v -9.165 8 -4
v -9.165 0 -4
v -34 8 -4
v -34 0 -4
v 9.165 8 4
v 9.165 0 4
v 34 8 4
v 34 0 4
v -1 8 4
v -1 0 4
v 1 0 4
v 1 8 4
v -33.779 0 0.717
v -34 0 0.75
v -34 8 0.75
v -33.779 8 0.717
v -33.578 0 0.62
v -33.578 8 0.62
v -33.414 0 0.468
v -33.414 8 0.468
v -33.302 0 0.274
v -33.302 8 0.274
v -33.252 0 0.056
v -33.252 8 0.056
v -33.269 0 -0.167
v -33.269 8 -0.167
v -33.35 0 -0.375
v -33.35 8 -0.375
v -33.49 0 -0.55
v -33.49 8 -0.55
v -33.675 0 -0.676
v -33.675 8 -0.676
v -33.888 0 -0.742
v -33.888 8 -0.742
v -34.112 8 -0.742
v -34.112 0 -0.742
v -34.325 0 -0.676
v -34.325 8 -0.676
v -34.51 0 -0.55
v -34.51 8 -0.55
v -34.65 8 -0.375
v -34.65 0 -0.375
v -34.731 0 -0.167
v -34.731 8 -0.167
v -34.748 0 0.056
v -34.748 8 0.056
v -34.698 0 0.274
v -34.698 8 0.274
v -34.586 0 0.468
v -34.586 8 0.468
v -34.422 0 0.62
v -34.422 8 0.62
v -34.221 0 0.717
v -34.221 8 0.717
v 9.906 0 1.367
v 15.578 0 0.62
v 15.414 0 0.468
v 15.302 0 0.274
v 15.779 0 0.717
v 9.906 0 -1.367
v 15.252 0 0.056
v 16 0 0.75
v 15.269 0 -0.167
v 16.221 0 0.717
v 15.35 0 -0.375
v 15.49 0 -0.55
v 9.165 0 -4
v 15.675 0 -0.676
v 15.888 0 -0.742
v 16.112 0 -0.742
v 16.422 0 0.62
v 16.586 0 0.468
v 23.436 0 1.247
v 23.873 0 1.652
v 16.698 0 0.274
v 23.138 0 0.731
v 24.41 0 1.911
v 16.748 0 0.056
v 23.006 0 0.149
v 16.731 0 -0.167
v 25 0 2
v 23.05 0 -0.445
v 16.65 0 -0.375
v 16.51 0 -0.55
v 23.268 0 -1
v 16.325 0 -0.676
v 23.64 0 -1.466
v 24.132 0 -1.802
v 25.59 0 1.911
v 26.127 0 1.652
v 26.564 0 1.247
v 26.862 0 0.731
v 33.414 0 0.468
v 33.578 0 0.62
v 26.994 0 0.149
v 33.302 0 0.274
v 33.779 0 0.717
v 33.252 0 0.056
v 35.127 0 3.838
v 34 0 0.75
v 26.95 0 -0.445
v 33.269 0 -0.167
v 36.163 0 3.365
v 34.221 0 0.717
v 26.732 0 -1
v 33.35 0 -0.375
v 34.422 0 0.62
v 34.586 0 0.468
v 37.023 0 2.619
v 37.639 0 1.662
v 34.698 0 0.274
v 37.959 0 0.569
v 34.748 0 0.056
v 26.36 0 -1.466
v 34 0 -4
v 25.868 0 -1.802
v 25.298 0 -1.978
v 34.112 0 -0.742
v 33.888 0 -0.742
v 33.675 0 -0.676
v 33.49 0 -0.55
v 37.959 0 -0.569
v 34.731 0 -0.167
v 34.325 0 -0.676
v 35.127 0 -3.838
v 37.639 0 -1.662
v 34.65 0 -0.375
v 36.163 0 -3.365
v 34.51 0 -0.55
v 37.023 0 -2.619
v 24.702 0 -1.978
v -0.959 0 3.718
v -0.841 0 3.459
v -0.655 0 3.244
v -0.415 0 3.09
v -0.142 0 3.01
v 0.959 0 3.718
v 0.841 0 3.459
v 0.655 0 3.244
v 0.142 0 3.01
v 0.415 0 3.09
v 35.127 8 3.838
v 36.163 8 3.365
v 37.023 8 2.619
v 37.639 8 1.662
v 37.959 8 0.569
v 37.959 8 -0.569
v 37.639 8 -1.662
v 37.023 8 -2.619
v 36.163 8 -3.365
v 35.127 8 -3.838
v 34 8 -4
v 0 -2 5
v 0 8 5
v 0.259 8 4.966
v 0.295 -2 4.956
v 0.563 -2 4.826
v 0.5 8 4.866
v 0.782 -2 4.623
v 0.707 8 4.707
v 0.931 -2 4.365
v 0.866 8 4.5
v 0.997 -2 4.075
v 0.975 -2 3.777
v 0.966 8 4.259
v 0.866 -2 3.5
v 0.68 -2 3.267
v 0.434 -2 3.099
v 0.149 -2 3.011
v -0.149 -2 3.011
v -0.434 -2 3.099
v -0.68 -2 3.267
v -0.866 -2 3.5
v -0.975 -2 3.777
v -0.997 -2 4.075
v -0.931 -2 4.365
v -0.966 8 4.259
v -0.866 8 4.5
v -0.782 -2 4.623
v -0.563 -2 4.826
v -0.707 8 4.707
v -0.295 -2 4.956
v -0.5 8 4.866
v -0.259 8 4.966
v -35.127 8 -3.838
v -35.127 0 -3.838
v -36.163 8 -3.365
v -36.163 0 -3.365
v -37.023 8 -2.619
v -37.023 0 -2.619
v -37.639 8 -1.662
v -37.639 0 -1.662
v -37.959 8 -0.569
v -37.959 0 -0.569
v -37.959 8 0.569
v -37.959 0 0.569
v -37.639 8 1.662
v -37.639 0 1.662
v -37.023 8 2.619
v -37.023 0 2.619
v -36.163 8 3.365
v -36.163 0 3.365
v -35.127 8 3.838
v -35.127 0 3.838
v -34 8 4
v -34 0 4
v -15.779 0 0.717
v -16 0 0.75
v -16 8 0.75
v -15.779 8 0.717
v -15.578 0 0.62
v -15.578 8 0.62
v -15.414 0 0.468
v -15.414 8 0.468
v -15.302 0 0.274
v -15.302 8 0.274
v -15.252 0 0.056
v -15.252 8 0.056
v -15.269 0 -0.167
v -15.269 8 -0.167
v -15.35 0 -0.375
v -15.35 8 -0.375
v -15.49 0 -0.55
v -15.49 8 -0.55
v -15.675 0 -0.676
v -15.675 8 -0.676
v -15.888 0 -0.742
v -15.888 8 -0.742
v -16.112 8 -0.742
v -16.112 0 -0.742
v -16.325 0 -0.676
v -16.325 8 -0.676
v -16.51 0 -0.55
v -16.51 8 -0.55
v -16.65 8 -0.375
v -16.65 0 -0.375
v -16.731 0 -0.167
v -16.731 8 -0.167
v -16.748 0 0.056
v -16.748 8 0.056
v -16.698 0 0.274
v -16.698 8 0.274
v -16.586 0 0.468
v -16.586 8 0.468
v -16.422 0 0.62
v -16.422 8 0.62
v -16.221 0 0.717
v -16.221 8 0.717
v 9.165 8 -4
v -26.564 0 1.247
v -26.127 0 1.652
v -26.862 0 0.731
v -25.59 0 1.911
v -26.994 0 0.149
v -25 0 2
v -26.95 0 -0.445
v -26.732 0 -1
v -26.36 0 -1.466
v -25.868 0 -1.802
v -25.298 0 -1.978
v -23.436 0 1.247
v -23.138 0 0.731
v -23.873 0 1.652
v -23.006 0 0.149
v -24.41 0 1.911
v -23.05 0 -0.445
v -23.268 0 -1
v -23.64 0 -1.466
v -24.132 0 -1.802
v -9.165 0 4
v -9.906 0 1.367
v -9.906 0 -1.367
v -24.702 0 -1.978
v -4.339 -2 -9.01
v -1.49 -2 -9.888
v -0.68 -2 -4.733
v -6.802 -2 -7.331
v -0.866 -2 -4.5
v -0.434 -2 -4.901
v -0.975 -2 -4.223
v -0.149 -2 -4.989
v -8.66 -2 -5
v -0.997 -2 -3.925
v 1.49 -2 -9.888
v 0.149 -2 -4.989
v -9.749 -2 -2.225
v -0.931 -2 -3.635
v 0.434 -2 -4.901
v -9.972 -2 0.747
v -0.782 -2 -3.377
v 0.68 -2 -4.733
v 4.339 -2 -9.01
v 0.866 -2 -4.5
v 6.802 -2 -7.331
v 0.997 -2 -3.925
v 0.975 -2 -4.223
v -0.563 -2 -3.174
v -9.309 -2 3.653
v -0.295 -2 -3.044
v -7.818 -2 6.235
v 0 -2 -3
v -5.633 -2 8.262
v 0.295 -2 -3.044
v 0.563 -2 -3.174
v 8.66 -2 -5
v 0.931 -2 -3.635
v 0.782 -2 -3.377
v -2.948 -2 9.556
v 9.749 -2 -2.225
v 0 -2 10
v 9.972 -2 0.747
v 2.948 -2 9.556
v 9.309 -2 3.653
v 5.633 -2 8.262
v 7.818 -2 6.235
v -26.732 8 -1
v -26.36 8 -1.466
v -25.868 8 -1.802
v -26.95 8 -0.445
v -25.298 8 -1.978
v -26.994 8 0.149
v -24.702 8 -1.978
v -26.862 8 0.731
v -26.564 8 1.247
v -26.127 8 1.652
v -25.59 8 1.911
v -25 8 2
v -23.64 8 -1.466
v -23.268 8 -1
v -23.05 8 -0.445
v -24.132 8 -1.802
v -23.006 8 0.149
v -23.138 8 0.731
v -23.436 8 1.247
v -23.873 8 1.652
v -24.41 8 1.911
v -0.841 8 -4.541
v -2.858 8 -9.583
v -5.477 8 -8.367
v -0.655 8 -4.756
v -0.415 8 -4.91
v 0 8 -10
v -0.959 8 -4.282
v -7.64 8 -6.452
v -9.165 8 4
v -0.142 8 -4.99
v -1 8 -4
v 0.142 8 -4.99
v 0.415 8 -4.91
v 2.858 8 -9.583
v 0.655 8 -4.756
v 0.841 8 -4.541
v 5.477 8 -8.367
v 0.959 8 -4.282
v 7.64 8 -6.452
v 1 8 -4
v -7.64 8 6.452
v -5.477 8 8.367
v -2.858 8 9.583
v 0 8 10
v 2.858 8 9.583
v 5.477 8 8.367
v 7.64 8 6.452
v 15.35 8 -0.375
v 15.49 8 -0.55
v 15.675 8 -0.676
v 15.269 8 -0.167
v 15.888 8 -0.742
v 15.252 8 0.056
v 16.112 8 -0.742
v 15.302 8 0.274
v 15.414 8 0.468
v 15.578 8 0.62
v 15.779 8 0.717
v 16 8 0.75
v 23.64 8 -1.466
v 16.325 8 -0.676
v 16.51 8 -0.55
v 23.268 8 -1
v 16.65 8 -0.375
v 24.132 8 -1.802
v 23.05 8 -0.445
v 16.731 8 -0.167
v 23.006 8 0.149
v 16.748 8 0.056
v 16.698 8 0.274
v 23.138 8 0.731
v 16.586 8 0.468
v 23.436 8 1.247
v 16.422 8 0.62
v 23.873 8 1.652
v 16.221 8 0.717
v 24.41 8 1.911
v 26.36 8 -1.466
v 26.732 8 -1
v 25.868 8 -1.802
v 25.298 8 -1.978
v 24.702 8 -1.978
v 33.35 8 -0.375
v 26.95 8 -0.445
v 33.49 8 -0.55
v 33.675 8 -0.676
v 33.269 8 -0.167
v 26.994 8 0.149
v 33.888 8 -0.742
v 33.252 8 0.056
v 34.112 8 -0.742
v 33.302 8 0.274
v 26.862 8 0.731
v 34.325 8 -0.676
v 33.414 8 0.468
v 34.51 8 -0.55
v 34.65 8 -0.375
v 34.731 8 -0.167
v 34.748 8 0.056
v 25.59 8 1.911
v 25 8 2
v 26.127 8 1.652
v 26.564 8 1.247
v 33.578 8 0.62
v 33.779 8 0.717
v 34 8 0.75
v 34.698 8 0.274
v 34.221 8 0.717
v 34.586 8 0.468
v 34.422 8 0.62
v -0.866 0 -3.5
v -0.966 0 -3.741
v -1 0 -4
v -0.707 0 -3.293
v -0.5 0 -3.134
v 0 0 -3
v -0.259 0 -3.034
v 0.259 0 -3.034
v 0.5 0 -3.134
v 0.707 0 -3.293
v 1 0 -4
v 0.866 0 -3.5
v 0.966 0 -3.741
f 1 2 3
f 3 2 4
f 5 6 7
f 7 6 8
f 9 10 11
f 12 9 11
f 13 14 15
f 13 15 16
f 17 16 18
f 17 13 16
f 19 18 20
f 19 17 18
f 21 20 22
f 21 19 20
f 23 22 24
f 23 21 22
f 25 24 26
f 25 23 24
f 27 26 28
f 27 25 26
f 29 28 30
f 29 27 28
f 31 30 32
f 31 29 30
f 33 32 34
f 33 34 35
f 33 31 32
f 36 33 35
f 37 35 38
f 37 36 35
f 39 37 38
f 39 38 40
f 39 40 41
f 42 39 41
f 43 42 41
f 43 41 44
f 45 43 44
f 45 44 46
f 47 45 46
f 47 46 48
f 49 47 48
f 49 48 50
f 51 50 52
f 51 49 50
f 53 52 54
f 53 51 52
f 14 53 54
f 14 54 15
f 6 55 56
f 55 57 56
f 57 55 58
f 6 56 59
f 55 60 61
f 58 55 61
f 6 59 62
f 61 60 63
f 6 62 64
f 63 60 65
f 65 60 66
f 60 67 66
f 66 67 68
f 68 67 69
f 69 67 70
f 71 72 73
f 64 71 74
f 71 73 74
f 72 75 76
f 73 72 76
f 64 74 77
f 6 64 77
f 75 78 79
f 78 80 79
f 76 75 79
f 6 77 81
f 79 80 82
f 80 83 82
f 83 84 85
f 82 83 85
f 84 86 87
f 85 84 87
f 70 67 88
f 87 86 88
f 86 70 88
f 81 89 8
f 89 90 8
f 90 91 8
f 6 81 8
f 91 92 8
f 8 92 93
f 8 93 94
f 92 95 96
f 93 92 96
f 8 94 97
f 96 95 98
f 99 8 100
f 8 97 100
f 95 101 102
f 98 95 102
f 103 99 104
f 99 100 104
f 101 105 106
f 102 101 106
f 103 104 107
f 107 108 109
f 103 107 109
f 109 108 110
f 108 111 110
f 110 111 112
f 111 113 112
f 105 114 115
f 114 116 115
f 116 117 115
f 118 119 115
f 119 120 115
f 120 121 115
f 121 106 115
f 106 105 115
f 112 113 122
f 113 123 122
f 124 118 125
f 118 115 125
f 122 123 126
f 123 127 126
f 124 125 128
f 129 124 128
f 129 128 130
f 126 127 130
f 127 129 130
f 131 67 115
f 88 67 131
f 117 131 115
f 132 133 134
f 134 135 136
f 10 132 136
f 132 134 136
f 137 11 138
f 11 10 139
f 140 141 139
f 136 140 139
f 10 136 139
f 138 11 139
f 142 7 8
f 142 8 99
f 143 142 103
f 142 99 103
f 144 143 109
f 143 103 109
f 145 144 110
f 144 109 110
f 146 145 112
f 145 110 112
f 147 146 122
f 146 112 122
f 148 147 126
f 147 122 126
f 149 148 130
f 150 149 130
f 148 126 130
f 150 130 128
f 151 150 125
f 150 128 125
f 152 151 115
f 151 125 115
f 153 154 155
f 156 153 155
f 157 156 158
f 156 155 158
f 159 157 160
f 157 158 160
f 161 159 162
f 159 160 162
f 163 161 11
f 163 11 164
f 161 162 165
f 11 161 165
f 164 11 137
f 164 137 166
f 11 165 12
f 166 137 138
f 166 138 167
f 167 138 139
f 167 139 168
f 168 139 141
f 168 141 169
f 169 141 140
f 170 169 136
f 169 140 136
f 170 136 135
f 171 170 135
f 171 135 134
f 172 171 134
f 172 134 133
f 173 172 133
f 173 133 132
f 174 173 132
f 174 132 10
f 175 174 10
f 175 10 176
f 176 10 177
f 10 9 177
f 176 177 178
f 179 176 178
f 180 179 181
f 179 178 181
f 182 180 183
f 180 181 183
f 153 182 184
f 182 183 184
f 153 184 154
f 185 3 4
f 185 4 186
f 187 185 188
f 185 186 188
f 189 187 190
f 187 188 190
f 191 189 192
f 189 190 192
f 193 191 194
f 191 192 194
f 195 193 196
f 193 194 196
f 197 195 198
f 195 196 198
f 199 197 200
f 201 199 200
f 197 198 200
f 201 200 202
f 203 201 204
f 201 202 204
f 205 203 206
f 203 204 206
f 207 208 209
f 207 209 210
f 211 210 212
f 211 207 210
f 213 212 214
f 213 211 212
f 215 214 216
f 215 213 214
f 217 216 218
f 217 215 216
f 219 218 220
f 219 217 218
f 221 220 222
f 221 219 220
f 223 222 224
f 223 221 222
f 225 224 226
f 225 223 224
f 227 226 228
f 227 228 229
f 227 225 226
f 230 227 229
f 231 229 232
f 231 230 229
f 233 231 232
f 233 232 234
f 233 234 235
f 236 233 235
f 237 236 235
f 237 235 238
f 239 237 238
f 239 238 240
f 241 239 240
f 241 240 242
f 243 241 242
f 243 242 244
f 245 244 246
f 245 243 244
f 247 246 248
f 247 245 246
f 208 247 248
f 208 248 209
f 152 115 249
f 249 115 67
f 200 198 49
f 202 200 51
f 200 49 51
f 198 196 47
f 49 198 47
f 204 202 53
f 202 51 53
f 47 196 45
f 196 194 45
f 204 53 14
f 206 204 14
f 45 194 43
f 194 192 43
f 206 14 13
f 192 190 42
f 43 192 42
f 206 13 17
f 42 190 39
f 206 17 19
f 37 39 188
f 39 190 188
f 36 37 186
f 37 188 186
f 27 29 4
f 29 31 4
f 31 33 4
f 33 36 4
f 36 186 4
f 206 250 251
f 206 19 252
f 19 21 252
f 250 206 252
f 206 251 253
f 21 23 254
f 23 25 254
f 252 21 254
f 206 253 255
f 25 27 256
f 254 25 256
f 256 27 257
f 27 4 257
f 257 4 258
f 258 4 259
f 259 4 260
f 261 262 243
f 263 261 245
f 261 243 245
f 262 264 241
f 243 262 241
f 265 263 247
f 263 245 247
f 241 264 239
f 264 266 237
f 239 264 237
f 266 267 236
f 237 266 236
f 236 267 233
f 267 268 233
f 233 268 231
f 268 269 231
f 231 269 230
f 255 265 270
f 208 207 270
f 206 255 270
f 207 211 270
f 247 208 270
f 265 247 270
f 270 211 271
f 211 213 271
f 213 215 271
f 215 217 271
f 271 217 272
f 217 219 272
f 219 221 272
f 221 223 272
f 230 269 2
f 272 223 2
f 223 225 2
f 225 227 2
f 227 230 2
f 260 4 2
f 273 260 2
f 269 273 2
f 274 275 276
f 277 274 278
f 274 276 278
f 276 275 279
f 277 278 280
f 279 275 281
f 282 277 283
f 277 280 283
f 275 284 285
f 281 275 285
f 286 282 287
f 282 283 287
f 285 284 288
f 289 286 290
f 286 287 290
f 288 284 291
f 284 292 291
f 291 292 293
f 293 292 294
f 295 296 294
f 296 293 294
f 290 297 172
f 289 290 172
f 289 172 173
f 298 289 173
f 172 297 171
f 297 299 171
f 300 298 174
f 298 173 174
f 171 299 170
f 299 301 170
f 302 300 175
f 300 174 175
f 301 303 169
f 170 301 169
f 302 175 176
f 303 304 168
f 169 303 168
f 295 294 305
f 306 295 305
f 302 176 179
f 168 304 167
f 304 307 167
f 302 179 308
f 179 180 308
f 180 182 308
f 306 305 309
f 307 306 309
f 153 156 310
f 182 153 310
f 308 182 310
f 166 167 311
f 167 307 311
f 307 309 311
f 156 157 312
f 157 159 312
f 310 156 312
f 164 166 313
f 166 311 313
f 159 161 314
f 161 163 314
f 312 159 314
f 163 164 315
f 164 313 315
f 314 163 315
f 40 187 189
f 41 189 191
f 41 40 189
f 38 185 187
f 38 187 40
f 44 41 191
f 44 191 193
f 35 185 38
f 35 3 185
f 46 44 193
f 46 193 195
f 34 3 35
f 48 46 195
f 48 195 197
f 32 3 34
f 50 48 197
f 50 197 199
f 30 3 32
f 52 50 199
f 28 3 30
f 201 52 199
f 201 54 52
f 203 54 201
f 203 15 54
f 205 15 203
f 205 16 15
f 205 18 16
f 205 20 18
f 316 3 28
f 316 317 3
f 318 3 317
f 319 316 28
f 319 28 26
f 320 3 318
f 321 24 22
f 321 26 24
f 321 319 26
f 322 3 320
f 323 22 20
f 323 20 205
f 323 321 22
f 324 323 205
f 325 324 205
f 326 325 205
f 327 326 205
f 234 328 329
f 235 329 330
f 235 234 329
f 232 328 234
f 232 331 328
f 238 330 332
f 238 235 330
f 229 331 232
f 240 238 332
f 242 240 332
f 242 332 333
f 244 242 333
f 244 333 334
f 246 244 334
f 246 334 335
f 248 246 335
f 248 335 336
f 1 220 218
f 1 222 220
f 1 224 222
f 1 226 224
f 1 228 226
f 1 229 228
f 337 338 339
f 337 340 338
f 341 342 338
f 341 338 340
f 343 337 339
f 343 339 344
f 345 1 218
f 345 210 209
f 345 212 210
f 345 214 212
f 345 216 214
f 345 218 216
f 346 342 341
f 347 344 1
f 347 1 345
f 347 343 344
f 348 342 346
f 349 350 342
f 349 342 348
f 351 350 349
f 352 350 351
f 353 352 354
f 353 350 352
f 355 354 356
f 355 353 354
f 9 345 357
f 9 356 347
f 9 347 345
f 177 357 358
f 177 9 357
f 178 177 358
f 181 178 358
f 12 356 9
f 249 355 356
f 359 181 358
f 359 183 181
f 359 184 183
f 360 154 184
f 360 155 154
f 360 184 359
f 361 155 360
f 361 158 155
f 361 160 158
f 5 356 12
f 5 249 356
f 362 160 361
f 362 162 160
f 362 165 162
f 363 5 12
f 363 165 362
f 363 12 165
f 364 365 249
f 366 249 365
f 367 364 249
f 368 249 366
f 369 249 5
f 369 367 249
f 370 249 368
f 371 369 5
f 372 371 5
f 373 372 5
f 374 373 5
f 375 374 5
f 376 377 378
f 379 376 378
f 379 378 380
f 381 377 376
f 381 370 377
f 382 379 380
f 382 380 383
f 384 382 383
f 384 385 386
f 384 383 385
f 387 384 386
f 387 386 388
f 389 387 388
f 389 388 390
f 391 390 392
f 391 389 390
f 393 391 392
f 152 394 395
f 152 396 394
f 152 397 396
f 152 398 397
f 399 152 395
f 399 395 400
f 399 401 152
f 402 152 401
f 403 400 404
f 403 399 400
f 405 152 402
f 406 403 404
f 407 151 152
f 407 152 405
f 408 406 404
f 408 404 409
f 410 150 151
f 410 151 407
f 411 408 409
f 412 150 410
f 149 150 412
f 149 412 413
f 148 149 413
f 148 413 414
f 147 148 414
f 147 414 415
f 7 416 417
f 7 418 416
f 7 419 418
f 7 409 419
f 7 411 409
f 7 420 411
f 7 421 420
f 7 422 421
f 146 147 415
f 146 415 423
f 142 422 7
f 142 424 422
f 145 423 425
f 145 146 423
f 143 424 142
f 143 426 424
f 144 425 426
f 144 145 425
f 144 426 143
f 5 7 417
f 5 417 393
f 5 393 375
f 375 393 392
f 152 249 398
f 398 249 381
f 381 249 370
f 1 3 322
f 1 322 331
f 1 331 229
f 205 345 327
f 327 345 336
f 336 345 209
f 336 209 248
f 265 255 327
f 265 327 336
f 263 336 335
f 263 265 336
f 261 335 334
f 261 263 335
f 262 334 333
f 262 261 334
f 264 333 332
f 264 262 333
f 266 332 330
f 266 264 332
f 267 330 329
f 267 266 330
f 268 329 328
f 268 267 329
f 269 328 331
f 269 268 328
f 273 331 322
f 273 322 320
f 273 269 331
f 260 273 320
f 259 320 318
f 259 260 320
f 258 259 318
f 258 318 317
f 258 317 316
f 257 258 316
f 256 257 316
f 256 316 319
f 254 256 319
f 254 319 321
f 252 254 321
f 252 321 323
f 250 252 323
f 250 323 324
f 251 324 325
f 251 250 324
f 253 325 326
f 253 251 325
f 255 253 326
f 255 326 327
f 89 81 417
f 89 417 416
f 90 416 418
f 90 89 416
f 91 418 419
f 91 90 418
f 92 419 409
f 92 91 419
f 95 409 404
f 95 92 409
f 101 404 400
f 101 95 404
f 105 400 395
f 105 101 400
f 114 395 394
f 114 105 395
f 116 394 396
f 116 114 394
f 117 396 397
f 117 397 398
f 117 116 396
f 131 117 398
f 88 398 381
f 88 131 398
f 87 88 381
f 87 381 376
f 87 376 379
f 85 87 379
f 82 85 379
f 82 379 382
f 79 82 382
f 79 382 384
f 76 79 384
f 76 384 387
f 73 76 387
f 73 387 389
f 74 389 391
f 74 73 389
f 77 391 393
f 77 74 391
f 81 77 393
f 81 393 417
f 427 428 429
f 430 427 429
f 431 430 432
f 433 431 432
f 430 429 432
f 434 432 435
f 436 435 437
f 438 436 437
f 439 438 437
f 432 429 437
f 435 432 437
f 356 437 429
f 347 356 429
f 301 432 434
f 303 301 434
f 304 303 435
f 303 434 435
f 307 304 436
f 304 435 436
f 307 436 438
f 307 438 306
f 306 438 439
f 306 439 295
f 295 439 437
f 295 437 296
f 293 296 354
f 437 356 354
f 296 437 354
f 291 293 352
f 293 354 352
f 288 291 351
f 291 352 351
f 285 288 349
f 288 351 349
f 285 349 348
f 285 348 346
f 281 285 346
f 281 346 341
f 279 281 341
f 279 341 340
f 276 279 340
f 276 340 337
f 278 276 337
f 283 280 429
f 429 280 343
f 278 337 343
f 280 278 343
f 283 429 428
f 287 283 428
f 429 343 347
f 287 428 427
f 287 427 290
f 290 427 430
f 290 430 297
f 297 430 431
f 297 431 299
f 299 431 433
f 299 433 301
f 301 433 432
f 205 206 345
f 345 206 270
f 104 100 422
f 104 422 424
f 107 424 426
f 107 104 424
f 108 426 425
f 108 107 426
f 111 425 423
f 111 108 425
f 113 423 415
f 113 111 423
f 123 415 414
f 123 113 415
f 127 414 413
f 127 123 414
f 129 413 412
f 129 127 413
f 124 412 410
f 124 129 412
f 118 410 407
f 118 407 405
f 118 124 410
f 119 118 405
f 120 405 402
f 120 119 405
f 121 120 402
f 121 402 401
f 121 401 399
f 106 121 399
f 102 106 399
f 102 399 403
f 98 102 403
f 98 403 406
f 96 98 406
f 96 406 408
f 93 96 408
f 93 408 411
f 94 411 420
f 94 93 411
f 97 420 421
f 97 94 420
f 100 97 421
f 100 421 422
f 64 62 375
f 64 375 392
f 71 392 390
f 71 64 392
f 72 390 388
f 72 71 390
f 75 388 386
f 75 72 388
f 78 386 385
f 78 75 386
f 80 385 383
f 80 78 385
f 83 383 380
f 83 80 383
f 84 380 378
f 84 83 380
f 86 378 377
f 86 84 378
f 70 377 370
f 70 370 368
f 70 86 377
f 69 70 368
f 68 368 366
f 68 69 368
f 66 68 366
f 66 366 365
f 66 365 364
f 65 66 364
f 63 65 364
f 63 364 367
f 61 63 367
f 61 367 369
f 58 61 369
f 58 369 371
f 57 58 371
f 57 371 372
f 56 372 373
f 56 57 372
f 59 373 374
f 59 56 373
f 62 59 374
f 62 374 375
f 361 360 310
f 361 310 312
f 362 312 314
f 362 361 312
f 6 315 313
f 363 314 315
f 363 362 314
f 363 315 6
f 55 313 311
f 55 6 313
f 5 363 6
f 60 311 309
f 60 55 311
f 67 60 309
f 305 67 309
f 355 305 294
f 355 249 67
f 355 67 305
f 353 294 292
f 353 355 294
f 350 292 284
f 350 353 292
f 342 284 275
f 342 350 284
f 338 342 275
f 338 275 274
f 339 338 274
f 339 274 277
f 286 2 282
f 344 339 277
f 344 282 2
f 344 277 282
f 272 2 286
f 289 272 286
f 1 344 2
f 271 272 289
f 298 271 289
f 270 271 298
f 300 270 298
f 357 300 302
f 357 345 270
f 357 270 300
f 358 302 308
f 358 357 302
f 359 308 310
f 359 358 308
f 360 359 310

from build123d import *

# Parameters (mm, degrees)
SKETCH_1_R      = 0.75
SKETCH_1_R_2    = 2
EXTRUDE_1_DEPTH = 8
SKETCH_2_R      = 10
SKETCH_2_R_2    = 1
EXTRUDE_2_DEPTH = 10


with BuildPart() as part:
    # 草圖1 → 填料-伸長1 (new body)
    with BuildSketch(Plane(origin=(0, 0, 0), x_dir=(1, 0, 0), z_dir=(0, 1, 0))):
        with BuildLine():
            Line((-0.414012206, -4), (25, -4))
            Line((25, -4), (34, -4))
            ThreePointArc((34, -4), (38, 0), (34, 4))
            Line((34, 4), (25, 4))
            Line((25, 4), (-0.414012206, 4))
            Line((-0.414012206, 4), (-34, 4))
            ThreePointArc((-34, 4), (-38, 0), (-34, -4))
            Line((-34, -4), (-0.414012206, -4))
        make_face()
        with Locations(Location((34, 0, 0), (0, 0, 270))):
            Circle(SKETCH_1_R, mode=Mode.SUBTRACT)
        with Locations(Location((-34, 0, 0), (0, 0, 270))):
            Circle(SKETCH_1_R, mode=Mode.SUBTRACT)
        with Locations(Location((-25, 0, 0), (0, 0, 270))):
            Circle(SKETCH_1_R_2, mode=Mode.SUBTRACT)
        with Locations(Location((25, 0, 0), (0, 0, 270))):
            Circle(SKETCH_1_R_2, mode=Mode.SUBTRACT)
        with Locations(Location((-16, 0, 0), (0, 0, 270))):
            Circle(SKETCH_1_R, mode=Mode.SUBTRACT)
        with Locations(Location((16, 0, 0), (0, 0, 270))):
            Circle(SKETCH_1_R, mode=Mode.SUBTRACT)
    extrude(amount=EXTRUDE_1_DEPTH)

    # 草圖2 → 填料-伸長2 (add)
    with BuildSketch(Plane(origin=(0, 8, 0), x_dir=(-1, 0, 0), z_dir=(0, 1, 0))):
        with Locations(Location((0, 0, 0), (0, 0, 90))):
            Circle(SKETCH_2_R)
        with Locations(Location((0, -4, 0), (0, 0, 90))):
            Circle(SKETCH_2_R_2, mode=Mode.SUBTRACT)
        with Locations(Location((0, 4, 0), (0, 0, 90))):
            Circle(SKETCH_2_R_2, mode=Mode.SUBTRACT)
    extrude(amount=-EXTRUDE_2_DEPTH)


solid = part.part
